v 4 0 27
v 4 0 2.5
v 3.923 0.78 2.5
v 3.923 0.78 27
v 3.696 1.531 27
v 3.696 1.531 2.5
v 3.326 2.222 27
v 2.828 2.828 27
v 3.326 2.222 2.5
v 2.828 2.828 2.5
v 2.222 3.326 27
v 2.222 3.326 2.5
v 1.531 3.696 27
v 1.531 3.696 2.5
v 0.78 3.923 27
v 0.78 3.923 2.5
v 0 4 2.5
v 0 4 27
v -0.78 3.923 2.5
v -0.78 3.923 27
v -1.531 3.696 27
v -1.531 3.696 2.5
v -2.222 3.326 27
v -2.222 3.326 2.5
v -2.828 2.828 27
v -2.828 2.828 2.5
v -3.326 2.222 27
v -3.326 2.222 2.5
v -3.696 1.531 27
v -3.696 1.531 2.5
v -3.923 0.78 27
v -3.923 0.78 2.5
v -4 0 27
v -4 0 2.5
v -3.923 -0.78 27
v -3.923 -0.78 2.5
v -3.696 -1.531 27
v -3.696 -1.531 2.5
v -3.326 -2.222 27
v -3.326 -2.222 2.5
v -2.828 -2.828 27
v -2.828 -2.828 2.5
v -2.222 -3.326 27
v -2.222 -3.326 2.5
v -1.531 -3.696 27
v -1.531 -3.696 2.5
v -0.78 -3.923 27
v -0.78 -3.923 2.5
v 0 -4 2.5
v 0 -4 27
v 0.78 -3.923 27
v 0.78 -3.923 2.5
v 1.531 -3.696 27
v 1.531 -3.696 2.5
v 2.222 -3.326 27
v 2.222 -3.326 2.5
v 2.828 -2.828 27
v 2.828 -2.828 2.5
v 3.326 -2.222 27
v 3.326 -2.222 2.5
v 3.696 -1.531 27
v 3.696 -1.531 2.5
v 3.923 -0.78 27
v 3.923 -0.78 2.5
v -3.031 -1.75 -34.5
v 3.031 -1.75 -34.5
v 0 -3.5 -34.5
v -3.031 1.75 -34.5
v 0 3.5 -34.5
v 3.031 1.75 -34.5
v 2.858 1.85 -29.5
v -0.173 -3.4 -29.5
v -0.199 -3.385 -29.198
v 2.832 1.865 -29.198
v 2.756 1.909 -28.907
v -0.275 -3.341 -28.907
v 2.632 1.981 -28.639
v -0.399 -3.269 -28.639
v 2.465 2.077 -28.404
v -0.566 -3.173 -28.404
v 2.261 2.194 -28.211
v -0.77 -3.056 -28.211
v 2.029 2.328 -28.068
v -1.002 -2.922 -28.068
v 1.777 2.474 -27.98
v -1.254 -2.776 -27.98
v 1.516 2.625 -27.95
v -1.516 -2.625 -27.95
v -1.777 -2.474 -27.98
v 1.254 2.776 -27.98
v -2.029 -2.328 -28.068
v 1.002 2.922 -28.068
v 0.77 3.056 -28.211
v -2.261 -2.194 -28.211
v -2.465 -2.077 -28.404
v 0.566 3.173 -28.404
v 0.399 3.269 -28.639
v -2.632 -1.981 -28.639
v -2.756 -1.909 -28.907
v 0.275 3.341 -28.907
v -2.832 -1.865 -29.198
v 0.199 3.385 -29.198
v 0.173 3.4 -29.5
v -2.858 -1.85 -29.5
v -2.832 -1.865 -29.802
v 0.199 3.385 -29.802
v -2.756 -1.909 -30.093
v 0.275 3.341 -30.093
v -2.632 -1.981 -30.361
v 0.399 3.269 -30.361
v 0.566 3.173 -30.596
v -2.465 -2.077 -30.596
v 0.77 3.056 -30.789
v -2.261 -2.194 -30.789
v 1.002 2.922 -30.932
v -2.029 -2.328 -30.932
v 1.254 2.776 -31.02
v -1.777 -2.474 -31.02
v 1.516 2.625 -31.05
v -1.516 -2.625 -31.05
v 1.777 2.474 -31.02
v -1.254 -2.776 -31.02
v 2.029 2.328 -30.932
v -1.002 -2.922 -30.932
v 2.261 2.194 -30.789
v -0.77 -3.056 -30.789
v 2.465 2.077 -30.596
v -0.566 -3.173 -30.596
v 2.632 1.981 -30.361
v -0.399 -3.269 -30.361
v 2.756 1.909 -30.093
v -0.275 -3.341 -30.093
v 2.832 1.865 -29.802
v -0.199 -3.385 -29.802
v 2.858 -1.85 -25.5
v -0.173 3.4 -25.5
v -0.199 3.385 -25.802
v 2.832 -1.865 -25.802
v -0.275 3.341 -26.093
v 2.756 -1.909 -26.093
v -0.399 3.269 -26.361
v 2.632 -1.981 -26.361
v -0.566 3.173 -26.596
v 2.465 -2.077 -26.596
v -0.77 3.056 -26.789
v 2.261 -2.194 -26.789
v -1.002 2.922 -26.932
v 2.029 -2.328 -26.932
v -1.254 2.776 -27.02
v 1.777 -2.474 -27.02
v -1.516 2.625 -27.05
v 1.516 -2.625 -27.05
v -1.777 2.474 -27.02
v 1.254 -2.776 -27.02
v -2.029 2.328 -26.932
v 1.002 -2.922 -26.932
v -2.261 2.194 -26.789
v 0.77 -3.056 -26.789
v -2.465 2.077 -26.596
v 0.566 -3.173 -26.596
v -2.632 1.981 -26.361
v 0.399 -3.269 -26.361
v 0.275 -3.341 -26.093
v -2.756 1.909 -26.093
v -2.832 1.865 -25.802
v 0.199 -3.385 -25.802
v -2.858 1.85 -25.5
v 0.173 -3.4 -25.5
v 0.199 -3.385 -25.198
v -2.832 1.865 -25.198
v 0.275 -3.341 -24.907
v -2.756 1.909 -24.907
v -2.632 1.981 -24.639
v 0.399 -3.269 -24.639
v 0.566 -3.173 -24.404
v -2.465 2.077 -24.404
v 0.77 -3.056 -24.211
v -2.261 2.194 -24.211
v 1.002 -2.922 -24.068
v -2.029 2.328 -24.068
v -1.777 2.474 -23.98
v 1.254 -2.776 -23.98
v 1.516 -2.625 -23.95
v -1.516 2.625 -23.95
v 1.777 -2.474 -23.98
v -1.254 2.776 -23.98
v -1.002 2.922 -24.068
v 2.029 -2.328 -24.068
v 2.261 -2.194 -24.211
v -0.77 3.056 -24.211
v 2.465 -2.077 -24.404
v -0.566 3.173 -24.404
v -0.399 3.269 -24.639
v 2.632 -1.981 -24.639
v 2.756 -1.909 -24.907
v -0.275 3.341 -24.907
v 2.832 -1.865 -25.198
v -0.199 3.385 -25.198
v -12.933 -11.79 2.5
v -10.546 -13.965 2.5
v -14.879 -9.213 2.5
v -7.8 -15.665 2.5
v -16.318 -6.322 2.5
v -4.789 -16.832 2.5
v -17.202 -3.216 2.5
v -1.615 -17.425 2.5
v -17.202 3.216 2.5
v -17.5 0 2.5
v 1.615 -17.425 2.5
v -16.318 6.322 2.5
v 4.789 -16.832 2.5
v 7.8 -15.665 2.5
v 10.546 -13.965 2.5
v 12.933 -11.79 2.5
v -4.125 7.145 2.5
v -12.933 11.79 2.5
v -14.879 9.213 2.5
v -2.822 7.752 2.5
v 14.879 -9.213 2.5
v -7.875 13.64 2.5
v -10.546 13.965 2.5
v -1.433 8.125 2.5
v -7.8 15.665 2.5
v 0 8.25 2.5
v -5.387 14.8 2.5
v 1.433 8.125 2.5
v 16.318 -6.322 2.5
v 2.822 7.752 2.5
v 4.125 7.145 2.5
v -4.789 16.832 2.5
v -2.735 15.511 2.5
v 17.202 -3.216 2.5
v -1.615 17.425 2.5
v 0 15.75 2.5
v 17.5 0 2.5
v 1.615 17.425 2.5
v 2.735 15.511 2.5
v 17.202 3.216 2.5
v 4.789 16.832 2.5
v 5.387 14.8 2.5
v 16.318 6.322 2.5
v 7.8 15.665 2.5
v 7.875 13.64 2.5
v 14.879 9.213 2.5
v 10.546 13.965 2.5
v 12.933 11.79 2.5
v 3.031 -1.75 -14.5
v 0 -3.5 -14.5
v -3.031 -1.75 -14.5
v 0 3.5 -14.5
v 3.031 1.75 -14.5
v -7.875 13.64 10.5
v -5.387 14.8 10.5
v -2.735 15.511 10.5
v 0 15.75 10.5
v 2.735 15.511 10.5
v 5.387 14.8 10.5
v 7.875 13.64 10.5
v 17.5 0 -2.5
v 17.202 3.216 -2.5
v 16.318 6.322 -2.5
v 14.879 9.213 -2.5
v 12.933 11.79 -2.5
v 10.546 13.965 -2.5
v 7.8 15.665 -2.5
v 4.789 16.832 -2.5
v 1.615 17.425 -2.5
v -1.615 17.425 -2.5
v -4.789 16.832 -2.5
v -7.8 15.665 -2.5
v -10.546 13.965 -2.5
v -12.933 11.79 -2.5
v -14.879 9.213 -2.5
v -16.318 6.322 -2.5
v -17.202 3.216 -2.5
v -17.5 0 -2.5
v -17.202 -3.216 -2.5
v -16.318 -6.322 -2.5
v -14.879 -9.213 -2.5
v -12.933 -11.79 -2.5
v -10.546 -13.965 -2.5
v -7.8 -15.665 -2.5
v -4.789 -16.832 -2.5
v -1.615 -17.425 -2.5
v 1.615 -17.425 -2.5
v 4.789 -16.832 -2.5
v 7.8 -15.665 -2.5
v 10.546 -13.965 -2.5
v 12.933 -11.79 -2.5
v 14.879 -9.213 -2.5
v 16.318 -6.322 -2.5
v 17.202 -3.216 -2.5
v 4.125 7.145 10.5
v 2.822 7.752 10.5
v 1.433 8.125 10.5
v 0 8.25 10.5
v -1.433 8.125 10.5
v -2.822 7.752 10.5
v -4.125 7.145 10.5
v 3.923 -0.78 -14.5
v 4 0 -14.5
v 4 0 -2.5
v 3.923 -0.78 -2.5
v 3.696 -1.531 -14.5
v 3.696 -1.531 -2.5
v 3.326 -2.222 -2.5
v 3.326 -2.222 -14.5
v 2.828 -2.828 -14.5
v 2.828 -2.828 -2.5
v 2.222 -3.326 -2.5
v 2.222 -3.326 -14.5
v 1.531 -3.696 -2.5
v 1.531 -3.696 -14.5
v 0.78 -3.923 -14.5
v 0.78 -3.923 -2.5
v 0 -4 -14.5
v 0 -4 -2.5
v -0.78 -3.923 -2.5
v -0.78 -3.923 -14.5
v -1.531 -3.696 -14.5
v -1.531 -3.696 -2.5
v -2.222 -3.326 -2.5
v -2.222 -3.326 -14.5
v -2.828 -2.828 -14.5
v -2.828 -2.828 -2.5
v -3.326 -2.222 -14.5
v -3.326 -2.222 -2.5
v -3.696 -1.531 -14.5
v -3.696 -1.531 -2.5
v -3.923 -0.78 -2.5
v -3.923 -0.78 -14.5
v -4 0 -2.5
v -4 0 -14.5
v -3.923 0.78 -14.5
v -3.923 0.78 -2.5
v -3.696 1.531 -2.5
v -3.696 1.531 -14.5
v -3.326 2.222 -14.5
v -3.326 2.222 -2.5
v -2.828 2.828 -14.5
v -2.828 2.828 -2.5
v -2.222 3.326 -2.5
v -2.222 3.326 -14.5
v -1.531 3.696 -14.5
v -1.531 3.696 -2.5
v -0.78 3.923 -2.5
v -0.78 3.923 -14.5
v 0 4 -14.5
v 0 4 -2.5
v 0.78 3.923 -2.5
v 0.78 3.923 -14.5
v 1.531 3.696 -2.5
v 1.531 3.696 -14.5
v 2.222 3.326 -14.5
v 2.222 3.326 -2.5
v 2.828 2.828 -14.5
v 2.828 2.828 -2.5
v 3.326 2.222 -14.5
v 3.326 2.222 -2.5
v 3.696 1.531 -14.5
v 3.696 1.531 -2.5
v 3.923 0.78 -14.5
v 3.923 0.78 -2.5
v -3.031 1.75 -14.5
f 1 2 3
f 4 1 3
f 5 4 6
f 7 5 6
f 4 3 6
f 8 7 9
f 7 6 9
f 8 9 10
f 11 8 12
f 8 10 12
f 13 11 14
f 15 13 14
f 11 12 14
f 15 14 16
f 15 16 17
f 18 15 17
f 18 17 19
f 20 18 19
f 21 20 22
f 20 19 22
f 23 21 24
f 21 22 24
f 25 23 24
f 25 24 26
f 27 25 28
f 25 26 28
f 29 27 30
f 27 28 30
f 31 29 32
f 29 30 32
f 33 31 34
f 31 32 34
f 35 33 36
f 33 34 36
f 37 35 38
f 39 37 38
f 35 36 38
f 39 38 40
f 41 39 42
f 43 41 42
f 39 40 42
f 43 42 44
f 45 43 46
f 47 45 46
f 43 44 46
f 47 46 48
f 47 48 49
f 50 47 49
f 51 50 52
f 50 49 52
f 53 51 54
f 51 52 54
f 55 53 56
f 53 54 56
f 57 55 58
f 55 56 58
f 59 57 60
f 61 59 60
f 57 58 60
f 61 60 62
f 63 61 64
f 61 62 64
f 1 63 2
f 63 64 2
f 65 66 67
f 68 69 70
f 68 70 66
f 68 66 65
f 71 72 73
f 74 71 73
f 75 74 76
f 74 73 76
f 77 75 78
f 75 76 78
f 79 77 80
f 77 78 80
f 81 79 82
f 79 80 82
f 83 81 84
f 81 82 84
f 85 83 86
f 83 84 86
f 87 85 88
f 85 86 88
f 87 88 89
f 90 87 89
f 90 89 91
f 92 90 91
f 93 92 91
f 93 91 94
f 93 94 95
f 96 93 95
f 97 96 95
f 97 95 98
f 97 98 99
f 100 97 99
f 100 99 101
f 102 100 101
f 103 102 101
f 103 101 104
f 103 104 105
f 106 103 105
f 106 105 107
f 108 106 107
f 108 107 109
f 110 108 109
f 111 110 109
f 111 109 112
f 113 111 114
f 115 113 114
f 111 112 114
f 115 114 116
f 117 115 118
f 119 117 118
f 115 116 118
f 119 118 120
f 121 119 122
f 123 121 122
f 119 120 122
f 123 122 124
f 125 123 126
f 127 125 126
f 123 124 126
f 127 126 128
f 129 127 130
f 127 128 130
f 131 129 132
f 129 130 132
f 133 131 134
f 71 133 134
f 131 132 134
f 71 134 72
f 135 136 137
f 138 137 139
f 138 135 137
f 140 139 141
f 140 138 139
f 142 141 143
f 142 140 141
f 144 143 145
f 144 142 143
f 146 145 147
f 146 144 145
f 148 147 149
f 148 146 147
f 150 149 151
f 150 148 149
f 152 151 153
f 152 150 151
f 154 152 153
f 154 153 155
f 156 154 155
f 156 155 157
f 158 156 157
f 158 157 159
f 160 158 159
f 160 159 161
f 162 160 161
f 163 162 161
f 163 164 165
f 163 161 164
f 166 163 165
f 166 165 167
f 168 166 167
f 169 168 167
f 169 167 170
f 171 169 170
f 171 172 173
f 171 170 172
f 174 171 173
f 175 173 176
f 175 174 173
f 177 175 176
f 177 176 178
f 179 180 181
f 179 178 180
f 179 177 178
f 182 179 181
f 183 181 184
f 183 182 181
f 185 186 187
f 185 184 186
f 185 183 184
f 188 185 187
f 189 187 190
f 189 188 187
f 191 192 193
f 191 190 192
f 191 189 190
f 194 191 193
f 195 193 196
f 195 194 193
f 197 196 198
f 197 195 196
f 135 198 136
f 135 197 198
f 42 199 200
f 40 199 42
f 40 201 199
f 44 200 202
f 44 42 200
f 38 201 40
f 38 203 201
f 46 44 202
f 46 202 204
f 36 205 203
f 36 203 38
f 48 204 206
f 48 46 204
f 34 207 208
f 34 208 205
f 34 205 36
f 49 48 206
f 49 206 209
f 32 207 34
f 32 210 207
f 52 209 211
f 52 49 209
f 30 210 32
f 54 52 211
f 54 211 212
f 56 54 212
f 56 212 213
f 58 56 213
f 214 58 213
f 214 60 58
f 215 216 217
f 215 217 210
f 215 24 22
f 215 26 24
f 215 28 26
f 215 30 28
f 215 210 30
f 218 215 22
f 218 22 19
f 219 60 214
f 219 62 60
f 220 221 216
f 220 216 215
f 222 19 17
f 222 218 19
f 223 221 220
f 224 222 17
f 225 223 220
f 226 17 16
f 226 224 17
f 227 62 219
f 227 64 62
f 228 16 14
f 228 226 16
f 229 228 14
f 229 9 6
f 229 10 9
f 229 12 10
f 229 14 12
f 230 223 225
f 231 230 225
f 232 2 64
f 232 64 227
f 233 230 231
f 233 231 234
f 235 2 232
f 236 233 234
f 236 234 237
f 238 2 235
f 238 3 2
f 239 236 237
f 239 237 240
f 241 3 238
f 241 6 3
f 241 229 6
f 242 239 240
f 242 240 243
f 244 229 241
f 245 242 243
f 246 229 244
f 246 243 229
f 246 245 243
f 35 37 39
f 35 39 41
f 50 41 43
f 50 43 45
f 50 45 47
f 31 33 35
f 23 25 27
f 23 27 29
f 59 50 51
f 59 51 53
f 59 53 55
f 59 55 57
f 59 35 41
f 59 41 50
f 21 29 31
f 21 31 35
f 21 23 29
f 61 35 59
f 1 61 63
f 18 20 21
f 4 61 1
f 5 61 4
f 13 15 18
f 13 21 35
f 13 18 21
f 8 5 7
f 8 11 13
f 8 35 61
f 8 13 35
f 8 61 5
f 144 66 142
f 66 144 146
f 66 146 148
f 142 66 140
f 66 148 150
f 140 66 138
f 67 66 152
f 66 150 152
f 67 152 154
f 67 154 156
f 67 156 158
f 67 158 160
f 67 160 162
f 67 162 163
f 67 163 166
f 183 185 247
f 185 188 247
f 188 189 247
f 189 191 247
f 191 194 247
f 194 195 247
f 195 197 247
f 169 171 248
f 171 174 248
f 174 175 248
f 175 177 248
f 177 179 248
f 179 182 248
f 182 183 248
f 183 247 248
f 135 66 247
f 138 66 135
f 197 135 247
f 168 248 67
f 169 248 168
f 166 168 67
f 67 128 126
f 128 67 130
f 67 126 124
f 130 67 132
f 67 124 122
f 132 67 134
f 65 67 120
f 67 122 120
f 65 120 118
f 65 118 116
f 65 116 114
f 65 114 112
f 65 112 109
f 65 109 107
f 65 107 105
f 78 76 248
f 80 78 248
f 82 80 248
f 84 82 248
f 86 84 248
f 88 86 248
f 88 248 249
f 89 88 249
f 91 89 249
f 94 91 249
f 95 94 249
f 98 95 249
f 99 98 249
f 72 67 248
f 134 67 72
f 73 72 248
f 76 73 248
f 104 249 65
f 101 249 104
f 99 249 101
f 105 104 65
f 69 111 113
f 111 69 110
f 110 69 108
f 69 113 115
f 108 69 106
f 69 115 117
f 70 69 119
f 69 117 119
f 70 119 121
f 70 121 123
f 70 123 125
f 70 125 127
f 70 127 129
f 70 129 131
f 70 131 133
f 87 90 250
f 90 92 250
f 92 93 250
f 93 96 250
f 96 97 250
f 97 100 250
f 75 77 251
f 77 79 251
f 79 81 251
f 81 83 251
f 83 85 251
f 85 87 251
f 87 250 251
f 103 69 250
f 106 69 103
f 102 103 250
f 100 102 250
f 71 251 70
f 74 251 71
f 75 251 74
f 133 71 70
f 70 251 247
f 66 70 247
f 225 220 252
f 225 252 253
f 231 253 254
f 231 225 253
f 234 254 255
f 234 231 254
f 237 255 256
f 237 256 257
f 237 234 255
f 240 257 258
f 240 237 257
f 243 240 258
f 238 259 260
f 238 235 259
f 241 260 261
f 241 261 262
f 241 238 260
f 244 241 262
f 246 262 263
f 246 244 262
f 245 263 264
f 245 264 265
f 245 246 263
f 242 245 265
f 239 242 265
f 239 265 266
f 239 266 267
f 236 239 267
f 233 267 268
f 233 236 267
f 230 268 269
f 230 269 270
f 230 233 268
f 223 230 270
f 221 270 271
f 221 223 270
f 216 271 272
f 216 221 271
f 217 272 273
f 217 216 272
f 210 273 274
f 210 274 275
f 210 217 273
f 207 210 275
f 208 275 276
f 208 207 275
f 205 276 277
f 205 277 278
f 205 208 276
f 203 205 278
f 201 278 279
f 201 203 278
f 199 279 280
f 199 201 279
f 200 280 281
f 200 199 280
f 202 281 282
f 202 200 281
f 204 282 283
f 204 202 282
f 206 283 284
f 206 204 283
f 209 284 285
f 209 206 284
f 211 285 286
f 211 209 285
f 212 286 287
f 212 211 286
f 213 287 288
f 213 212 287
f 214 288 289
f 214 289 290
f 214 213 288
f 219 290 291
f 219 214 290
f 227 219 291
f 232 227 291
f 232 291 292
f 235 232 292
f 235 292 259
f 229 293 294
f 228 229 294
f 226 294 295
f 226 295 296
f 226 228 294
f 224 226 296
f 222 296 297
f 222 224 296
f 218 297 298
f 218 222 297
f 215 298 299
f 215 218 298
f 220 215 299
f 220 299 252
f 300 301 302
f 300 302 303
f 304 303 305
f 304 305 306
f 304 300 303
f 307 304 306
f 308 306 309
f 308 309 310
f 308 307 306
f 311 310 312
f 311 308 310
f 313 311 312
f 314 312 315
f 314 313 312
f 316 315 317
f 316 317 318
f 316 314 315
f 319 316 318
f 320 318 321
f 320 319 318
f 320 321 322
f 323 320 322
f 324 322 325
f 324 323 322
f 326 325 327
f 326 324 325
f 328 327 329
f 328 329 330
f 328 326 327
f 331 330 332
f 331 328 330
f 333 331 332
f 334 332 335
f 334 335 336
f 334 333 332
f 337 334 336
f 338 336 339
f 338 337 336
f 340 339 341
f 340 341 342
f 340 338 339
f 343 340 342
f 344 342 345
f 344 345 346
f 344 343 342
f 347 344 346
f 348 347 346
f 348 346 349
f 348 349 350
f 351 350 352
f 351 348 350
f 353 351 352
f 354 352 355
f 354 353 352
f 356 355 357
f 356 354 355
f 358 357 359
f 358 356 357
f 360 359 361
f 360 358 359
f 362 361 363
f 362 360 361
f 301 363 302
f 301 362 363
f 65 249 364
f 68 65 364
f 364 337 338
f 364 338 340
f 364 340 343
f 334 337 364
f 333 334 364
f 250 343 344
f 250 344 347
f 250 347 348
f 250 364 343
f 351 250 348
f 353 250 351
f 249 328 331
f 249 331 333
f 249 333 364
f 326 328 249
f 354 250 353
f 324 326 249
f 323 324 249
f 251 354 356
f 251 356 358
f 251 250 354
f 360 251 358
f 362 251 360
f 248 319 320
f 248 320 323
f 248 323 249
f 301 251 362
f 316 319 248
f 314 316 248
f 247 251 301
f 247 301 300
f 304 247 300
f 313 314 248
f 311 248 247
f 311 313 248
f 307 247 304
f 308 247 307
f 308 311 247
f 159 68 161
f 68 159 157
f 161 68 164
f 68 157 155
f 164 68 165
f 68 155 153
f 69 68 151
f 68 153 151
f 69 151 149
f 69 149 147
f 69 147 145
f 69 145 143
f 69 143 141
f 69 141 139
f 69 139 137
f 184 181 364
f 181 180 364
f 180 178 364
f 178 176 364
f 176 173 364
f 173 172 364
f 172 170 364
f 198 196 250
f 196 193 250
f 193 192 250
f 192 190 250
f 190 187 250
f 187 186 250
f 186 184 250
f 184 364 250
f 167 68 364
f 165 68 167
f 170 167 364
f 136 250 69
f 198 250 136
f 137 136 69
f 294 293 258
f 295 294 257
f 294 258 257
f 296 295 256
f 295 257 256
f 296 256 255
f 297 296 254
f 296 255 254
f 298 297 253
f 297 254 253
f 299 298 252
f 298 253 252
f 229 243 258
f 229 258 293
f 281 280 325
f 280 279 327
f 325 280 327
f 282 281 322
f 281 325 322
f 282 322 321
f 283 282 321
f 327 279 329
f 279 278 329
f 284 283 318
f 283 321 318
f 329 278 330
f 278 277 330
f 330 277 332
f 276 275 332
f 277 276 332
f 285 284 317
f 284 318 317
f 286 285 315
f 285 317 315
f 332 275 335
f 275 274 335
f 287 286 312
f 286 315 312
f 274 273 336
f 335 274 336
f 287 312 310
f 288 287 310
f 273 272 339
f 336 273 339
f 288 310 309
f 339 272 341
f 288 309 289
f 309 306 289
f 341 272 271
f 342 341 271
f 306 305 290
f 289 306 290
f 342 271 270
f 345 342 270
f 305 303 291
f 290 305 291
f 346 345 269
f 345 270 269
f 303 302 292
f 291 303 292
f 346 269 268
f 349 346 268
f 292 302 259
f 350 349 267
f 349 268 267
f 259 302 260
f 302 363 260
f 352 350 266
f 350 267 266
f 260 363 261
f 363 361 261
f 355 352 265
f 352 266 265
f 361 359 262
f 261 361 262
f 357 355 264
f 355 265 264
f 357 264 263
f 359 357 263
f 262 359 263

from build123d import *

# Parameters (mm, degrees)
SKETCH1_R           = 17.5
BOSS_EXTRUDE1_DEPTH = 2.5
BOSS_EXTRUDE2_DEPTH = 8
SKETCH3_R           = 4
BOSS_EXTRUDE3_DEPTH = 24.5
BOSS_EXTRUDE4_START = 12
SKETCH7_R           = 4
BOSS_EXTRUDE4_DEPTH = 12
BOSS_EXTRUDE5_DEPTH = 20
SKETCH10_R          = 1.55
CUT_EXTRUDE1_DEPTH  = 6.1
SKETCH11_R          = 1.55
CUT_EXTRUDE4_DEPTH  = 6.1


with BuildPart() as part:
    # Sketch1 → Boss-Extrude1 (new, symmetric)
    with BuildSketch(Plane.XY):
        Circle(SKETCH1_R)
    extrude(amount=BOSS_EXTRUDE1_DEPTH, both=True)

    # Sketch2 → Boss-Extrude2 (add)
    with BuildSketch(Plane.XY.offset(2.5)):
        with BuildLine():
            Line((7.875, 13.63990011), (4.125, 7.144709581))
            ThreePointArc((4.125, 7.144709581), (0, 8.25), (-4.125, 7.144709581))
            Line((-4.125, 7.144709581), (-7.875, 13.63990011))
            ThreePointArc((-7.875, 13.63990011), (0, 15.75), (7.875, 13.63990011))
        make_face()
    extrude(amount=BOSS_EXTRUDE2_DEPTH)

    # Sketch3 → Boss-Extrude3 (add)
    with BuildSketch(Plane.XY.offset(2.5)):
        Circle(SKETCH3_R)
    extrude(amount=BOSS_EXTRUDE3_DEPTH)

    # Sketch7 → Boss-Extrude4 (add)
    with BuildSketch(Plane(origin=(0, 0, -2.5), x_dir=(-1, 0, 0), z_dir=(0, 0, -1)).offset(BOSS_EXTRUDE4_START)):
        with Locations(Location((0, 0, 0), (0, 0, 180))):
            Circle(SKETCH7_R)
    extrude(amount=-BOSS_EXTRUDE4_DEPTH)

    # Sketch9 → Boss-Extrude5 (add)
    with BuildSketch(Plane(origin=(0, 0, -14.5), x_dir=(-1, 0, 0), z_dir=(0, 0, -1))):
        Polygon((0, 3.5), (-3.031088913, 1.75), (-3.031088913, -1.75), (0, -3.5), (3.031088913, -1.75), (3.031088913, 1.75), align=None)
    extrude(amount=BOSS_EXTRUDE5_DEPTH)

    # Sketch10 → Cut-Extrude1 (cut)
    with BuildSketch(Plane(origin=(-1.515544457, -2.625, 0), x_dir=(0.866025403784435, -0.5000000000000062, 0), z_dir=(-0.5000000000000062, -0.866025403784435, 0))):
        with Locations((0, -29.5)):
            Circle(SKETCH10_R)
    extrude(amount=-CUT_EXTRUDE1_DEPTH, mode=Mode.SUBTRACT)

    # Sketch11 → Cut-Extrude4 (cut)
    with BuildSketch(Plane(origin=(1.515544457, -2.625, 0), x_dir=(0, 0, 1), z_dir=(-0.49999999999999717, 0.8660254037844404, 0))):
        with Locations(Location((-25.5, 0, 0), (0, 0, 90))):
            Circle(SKETCH11_R)
    extrude(amount=CUT_EXTRUDE4_DEPTH, mode=Mode.SUBTRACT)


solid = part.part
